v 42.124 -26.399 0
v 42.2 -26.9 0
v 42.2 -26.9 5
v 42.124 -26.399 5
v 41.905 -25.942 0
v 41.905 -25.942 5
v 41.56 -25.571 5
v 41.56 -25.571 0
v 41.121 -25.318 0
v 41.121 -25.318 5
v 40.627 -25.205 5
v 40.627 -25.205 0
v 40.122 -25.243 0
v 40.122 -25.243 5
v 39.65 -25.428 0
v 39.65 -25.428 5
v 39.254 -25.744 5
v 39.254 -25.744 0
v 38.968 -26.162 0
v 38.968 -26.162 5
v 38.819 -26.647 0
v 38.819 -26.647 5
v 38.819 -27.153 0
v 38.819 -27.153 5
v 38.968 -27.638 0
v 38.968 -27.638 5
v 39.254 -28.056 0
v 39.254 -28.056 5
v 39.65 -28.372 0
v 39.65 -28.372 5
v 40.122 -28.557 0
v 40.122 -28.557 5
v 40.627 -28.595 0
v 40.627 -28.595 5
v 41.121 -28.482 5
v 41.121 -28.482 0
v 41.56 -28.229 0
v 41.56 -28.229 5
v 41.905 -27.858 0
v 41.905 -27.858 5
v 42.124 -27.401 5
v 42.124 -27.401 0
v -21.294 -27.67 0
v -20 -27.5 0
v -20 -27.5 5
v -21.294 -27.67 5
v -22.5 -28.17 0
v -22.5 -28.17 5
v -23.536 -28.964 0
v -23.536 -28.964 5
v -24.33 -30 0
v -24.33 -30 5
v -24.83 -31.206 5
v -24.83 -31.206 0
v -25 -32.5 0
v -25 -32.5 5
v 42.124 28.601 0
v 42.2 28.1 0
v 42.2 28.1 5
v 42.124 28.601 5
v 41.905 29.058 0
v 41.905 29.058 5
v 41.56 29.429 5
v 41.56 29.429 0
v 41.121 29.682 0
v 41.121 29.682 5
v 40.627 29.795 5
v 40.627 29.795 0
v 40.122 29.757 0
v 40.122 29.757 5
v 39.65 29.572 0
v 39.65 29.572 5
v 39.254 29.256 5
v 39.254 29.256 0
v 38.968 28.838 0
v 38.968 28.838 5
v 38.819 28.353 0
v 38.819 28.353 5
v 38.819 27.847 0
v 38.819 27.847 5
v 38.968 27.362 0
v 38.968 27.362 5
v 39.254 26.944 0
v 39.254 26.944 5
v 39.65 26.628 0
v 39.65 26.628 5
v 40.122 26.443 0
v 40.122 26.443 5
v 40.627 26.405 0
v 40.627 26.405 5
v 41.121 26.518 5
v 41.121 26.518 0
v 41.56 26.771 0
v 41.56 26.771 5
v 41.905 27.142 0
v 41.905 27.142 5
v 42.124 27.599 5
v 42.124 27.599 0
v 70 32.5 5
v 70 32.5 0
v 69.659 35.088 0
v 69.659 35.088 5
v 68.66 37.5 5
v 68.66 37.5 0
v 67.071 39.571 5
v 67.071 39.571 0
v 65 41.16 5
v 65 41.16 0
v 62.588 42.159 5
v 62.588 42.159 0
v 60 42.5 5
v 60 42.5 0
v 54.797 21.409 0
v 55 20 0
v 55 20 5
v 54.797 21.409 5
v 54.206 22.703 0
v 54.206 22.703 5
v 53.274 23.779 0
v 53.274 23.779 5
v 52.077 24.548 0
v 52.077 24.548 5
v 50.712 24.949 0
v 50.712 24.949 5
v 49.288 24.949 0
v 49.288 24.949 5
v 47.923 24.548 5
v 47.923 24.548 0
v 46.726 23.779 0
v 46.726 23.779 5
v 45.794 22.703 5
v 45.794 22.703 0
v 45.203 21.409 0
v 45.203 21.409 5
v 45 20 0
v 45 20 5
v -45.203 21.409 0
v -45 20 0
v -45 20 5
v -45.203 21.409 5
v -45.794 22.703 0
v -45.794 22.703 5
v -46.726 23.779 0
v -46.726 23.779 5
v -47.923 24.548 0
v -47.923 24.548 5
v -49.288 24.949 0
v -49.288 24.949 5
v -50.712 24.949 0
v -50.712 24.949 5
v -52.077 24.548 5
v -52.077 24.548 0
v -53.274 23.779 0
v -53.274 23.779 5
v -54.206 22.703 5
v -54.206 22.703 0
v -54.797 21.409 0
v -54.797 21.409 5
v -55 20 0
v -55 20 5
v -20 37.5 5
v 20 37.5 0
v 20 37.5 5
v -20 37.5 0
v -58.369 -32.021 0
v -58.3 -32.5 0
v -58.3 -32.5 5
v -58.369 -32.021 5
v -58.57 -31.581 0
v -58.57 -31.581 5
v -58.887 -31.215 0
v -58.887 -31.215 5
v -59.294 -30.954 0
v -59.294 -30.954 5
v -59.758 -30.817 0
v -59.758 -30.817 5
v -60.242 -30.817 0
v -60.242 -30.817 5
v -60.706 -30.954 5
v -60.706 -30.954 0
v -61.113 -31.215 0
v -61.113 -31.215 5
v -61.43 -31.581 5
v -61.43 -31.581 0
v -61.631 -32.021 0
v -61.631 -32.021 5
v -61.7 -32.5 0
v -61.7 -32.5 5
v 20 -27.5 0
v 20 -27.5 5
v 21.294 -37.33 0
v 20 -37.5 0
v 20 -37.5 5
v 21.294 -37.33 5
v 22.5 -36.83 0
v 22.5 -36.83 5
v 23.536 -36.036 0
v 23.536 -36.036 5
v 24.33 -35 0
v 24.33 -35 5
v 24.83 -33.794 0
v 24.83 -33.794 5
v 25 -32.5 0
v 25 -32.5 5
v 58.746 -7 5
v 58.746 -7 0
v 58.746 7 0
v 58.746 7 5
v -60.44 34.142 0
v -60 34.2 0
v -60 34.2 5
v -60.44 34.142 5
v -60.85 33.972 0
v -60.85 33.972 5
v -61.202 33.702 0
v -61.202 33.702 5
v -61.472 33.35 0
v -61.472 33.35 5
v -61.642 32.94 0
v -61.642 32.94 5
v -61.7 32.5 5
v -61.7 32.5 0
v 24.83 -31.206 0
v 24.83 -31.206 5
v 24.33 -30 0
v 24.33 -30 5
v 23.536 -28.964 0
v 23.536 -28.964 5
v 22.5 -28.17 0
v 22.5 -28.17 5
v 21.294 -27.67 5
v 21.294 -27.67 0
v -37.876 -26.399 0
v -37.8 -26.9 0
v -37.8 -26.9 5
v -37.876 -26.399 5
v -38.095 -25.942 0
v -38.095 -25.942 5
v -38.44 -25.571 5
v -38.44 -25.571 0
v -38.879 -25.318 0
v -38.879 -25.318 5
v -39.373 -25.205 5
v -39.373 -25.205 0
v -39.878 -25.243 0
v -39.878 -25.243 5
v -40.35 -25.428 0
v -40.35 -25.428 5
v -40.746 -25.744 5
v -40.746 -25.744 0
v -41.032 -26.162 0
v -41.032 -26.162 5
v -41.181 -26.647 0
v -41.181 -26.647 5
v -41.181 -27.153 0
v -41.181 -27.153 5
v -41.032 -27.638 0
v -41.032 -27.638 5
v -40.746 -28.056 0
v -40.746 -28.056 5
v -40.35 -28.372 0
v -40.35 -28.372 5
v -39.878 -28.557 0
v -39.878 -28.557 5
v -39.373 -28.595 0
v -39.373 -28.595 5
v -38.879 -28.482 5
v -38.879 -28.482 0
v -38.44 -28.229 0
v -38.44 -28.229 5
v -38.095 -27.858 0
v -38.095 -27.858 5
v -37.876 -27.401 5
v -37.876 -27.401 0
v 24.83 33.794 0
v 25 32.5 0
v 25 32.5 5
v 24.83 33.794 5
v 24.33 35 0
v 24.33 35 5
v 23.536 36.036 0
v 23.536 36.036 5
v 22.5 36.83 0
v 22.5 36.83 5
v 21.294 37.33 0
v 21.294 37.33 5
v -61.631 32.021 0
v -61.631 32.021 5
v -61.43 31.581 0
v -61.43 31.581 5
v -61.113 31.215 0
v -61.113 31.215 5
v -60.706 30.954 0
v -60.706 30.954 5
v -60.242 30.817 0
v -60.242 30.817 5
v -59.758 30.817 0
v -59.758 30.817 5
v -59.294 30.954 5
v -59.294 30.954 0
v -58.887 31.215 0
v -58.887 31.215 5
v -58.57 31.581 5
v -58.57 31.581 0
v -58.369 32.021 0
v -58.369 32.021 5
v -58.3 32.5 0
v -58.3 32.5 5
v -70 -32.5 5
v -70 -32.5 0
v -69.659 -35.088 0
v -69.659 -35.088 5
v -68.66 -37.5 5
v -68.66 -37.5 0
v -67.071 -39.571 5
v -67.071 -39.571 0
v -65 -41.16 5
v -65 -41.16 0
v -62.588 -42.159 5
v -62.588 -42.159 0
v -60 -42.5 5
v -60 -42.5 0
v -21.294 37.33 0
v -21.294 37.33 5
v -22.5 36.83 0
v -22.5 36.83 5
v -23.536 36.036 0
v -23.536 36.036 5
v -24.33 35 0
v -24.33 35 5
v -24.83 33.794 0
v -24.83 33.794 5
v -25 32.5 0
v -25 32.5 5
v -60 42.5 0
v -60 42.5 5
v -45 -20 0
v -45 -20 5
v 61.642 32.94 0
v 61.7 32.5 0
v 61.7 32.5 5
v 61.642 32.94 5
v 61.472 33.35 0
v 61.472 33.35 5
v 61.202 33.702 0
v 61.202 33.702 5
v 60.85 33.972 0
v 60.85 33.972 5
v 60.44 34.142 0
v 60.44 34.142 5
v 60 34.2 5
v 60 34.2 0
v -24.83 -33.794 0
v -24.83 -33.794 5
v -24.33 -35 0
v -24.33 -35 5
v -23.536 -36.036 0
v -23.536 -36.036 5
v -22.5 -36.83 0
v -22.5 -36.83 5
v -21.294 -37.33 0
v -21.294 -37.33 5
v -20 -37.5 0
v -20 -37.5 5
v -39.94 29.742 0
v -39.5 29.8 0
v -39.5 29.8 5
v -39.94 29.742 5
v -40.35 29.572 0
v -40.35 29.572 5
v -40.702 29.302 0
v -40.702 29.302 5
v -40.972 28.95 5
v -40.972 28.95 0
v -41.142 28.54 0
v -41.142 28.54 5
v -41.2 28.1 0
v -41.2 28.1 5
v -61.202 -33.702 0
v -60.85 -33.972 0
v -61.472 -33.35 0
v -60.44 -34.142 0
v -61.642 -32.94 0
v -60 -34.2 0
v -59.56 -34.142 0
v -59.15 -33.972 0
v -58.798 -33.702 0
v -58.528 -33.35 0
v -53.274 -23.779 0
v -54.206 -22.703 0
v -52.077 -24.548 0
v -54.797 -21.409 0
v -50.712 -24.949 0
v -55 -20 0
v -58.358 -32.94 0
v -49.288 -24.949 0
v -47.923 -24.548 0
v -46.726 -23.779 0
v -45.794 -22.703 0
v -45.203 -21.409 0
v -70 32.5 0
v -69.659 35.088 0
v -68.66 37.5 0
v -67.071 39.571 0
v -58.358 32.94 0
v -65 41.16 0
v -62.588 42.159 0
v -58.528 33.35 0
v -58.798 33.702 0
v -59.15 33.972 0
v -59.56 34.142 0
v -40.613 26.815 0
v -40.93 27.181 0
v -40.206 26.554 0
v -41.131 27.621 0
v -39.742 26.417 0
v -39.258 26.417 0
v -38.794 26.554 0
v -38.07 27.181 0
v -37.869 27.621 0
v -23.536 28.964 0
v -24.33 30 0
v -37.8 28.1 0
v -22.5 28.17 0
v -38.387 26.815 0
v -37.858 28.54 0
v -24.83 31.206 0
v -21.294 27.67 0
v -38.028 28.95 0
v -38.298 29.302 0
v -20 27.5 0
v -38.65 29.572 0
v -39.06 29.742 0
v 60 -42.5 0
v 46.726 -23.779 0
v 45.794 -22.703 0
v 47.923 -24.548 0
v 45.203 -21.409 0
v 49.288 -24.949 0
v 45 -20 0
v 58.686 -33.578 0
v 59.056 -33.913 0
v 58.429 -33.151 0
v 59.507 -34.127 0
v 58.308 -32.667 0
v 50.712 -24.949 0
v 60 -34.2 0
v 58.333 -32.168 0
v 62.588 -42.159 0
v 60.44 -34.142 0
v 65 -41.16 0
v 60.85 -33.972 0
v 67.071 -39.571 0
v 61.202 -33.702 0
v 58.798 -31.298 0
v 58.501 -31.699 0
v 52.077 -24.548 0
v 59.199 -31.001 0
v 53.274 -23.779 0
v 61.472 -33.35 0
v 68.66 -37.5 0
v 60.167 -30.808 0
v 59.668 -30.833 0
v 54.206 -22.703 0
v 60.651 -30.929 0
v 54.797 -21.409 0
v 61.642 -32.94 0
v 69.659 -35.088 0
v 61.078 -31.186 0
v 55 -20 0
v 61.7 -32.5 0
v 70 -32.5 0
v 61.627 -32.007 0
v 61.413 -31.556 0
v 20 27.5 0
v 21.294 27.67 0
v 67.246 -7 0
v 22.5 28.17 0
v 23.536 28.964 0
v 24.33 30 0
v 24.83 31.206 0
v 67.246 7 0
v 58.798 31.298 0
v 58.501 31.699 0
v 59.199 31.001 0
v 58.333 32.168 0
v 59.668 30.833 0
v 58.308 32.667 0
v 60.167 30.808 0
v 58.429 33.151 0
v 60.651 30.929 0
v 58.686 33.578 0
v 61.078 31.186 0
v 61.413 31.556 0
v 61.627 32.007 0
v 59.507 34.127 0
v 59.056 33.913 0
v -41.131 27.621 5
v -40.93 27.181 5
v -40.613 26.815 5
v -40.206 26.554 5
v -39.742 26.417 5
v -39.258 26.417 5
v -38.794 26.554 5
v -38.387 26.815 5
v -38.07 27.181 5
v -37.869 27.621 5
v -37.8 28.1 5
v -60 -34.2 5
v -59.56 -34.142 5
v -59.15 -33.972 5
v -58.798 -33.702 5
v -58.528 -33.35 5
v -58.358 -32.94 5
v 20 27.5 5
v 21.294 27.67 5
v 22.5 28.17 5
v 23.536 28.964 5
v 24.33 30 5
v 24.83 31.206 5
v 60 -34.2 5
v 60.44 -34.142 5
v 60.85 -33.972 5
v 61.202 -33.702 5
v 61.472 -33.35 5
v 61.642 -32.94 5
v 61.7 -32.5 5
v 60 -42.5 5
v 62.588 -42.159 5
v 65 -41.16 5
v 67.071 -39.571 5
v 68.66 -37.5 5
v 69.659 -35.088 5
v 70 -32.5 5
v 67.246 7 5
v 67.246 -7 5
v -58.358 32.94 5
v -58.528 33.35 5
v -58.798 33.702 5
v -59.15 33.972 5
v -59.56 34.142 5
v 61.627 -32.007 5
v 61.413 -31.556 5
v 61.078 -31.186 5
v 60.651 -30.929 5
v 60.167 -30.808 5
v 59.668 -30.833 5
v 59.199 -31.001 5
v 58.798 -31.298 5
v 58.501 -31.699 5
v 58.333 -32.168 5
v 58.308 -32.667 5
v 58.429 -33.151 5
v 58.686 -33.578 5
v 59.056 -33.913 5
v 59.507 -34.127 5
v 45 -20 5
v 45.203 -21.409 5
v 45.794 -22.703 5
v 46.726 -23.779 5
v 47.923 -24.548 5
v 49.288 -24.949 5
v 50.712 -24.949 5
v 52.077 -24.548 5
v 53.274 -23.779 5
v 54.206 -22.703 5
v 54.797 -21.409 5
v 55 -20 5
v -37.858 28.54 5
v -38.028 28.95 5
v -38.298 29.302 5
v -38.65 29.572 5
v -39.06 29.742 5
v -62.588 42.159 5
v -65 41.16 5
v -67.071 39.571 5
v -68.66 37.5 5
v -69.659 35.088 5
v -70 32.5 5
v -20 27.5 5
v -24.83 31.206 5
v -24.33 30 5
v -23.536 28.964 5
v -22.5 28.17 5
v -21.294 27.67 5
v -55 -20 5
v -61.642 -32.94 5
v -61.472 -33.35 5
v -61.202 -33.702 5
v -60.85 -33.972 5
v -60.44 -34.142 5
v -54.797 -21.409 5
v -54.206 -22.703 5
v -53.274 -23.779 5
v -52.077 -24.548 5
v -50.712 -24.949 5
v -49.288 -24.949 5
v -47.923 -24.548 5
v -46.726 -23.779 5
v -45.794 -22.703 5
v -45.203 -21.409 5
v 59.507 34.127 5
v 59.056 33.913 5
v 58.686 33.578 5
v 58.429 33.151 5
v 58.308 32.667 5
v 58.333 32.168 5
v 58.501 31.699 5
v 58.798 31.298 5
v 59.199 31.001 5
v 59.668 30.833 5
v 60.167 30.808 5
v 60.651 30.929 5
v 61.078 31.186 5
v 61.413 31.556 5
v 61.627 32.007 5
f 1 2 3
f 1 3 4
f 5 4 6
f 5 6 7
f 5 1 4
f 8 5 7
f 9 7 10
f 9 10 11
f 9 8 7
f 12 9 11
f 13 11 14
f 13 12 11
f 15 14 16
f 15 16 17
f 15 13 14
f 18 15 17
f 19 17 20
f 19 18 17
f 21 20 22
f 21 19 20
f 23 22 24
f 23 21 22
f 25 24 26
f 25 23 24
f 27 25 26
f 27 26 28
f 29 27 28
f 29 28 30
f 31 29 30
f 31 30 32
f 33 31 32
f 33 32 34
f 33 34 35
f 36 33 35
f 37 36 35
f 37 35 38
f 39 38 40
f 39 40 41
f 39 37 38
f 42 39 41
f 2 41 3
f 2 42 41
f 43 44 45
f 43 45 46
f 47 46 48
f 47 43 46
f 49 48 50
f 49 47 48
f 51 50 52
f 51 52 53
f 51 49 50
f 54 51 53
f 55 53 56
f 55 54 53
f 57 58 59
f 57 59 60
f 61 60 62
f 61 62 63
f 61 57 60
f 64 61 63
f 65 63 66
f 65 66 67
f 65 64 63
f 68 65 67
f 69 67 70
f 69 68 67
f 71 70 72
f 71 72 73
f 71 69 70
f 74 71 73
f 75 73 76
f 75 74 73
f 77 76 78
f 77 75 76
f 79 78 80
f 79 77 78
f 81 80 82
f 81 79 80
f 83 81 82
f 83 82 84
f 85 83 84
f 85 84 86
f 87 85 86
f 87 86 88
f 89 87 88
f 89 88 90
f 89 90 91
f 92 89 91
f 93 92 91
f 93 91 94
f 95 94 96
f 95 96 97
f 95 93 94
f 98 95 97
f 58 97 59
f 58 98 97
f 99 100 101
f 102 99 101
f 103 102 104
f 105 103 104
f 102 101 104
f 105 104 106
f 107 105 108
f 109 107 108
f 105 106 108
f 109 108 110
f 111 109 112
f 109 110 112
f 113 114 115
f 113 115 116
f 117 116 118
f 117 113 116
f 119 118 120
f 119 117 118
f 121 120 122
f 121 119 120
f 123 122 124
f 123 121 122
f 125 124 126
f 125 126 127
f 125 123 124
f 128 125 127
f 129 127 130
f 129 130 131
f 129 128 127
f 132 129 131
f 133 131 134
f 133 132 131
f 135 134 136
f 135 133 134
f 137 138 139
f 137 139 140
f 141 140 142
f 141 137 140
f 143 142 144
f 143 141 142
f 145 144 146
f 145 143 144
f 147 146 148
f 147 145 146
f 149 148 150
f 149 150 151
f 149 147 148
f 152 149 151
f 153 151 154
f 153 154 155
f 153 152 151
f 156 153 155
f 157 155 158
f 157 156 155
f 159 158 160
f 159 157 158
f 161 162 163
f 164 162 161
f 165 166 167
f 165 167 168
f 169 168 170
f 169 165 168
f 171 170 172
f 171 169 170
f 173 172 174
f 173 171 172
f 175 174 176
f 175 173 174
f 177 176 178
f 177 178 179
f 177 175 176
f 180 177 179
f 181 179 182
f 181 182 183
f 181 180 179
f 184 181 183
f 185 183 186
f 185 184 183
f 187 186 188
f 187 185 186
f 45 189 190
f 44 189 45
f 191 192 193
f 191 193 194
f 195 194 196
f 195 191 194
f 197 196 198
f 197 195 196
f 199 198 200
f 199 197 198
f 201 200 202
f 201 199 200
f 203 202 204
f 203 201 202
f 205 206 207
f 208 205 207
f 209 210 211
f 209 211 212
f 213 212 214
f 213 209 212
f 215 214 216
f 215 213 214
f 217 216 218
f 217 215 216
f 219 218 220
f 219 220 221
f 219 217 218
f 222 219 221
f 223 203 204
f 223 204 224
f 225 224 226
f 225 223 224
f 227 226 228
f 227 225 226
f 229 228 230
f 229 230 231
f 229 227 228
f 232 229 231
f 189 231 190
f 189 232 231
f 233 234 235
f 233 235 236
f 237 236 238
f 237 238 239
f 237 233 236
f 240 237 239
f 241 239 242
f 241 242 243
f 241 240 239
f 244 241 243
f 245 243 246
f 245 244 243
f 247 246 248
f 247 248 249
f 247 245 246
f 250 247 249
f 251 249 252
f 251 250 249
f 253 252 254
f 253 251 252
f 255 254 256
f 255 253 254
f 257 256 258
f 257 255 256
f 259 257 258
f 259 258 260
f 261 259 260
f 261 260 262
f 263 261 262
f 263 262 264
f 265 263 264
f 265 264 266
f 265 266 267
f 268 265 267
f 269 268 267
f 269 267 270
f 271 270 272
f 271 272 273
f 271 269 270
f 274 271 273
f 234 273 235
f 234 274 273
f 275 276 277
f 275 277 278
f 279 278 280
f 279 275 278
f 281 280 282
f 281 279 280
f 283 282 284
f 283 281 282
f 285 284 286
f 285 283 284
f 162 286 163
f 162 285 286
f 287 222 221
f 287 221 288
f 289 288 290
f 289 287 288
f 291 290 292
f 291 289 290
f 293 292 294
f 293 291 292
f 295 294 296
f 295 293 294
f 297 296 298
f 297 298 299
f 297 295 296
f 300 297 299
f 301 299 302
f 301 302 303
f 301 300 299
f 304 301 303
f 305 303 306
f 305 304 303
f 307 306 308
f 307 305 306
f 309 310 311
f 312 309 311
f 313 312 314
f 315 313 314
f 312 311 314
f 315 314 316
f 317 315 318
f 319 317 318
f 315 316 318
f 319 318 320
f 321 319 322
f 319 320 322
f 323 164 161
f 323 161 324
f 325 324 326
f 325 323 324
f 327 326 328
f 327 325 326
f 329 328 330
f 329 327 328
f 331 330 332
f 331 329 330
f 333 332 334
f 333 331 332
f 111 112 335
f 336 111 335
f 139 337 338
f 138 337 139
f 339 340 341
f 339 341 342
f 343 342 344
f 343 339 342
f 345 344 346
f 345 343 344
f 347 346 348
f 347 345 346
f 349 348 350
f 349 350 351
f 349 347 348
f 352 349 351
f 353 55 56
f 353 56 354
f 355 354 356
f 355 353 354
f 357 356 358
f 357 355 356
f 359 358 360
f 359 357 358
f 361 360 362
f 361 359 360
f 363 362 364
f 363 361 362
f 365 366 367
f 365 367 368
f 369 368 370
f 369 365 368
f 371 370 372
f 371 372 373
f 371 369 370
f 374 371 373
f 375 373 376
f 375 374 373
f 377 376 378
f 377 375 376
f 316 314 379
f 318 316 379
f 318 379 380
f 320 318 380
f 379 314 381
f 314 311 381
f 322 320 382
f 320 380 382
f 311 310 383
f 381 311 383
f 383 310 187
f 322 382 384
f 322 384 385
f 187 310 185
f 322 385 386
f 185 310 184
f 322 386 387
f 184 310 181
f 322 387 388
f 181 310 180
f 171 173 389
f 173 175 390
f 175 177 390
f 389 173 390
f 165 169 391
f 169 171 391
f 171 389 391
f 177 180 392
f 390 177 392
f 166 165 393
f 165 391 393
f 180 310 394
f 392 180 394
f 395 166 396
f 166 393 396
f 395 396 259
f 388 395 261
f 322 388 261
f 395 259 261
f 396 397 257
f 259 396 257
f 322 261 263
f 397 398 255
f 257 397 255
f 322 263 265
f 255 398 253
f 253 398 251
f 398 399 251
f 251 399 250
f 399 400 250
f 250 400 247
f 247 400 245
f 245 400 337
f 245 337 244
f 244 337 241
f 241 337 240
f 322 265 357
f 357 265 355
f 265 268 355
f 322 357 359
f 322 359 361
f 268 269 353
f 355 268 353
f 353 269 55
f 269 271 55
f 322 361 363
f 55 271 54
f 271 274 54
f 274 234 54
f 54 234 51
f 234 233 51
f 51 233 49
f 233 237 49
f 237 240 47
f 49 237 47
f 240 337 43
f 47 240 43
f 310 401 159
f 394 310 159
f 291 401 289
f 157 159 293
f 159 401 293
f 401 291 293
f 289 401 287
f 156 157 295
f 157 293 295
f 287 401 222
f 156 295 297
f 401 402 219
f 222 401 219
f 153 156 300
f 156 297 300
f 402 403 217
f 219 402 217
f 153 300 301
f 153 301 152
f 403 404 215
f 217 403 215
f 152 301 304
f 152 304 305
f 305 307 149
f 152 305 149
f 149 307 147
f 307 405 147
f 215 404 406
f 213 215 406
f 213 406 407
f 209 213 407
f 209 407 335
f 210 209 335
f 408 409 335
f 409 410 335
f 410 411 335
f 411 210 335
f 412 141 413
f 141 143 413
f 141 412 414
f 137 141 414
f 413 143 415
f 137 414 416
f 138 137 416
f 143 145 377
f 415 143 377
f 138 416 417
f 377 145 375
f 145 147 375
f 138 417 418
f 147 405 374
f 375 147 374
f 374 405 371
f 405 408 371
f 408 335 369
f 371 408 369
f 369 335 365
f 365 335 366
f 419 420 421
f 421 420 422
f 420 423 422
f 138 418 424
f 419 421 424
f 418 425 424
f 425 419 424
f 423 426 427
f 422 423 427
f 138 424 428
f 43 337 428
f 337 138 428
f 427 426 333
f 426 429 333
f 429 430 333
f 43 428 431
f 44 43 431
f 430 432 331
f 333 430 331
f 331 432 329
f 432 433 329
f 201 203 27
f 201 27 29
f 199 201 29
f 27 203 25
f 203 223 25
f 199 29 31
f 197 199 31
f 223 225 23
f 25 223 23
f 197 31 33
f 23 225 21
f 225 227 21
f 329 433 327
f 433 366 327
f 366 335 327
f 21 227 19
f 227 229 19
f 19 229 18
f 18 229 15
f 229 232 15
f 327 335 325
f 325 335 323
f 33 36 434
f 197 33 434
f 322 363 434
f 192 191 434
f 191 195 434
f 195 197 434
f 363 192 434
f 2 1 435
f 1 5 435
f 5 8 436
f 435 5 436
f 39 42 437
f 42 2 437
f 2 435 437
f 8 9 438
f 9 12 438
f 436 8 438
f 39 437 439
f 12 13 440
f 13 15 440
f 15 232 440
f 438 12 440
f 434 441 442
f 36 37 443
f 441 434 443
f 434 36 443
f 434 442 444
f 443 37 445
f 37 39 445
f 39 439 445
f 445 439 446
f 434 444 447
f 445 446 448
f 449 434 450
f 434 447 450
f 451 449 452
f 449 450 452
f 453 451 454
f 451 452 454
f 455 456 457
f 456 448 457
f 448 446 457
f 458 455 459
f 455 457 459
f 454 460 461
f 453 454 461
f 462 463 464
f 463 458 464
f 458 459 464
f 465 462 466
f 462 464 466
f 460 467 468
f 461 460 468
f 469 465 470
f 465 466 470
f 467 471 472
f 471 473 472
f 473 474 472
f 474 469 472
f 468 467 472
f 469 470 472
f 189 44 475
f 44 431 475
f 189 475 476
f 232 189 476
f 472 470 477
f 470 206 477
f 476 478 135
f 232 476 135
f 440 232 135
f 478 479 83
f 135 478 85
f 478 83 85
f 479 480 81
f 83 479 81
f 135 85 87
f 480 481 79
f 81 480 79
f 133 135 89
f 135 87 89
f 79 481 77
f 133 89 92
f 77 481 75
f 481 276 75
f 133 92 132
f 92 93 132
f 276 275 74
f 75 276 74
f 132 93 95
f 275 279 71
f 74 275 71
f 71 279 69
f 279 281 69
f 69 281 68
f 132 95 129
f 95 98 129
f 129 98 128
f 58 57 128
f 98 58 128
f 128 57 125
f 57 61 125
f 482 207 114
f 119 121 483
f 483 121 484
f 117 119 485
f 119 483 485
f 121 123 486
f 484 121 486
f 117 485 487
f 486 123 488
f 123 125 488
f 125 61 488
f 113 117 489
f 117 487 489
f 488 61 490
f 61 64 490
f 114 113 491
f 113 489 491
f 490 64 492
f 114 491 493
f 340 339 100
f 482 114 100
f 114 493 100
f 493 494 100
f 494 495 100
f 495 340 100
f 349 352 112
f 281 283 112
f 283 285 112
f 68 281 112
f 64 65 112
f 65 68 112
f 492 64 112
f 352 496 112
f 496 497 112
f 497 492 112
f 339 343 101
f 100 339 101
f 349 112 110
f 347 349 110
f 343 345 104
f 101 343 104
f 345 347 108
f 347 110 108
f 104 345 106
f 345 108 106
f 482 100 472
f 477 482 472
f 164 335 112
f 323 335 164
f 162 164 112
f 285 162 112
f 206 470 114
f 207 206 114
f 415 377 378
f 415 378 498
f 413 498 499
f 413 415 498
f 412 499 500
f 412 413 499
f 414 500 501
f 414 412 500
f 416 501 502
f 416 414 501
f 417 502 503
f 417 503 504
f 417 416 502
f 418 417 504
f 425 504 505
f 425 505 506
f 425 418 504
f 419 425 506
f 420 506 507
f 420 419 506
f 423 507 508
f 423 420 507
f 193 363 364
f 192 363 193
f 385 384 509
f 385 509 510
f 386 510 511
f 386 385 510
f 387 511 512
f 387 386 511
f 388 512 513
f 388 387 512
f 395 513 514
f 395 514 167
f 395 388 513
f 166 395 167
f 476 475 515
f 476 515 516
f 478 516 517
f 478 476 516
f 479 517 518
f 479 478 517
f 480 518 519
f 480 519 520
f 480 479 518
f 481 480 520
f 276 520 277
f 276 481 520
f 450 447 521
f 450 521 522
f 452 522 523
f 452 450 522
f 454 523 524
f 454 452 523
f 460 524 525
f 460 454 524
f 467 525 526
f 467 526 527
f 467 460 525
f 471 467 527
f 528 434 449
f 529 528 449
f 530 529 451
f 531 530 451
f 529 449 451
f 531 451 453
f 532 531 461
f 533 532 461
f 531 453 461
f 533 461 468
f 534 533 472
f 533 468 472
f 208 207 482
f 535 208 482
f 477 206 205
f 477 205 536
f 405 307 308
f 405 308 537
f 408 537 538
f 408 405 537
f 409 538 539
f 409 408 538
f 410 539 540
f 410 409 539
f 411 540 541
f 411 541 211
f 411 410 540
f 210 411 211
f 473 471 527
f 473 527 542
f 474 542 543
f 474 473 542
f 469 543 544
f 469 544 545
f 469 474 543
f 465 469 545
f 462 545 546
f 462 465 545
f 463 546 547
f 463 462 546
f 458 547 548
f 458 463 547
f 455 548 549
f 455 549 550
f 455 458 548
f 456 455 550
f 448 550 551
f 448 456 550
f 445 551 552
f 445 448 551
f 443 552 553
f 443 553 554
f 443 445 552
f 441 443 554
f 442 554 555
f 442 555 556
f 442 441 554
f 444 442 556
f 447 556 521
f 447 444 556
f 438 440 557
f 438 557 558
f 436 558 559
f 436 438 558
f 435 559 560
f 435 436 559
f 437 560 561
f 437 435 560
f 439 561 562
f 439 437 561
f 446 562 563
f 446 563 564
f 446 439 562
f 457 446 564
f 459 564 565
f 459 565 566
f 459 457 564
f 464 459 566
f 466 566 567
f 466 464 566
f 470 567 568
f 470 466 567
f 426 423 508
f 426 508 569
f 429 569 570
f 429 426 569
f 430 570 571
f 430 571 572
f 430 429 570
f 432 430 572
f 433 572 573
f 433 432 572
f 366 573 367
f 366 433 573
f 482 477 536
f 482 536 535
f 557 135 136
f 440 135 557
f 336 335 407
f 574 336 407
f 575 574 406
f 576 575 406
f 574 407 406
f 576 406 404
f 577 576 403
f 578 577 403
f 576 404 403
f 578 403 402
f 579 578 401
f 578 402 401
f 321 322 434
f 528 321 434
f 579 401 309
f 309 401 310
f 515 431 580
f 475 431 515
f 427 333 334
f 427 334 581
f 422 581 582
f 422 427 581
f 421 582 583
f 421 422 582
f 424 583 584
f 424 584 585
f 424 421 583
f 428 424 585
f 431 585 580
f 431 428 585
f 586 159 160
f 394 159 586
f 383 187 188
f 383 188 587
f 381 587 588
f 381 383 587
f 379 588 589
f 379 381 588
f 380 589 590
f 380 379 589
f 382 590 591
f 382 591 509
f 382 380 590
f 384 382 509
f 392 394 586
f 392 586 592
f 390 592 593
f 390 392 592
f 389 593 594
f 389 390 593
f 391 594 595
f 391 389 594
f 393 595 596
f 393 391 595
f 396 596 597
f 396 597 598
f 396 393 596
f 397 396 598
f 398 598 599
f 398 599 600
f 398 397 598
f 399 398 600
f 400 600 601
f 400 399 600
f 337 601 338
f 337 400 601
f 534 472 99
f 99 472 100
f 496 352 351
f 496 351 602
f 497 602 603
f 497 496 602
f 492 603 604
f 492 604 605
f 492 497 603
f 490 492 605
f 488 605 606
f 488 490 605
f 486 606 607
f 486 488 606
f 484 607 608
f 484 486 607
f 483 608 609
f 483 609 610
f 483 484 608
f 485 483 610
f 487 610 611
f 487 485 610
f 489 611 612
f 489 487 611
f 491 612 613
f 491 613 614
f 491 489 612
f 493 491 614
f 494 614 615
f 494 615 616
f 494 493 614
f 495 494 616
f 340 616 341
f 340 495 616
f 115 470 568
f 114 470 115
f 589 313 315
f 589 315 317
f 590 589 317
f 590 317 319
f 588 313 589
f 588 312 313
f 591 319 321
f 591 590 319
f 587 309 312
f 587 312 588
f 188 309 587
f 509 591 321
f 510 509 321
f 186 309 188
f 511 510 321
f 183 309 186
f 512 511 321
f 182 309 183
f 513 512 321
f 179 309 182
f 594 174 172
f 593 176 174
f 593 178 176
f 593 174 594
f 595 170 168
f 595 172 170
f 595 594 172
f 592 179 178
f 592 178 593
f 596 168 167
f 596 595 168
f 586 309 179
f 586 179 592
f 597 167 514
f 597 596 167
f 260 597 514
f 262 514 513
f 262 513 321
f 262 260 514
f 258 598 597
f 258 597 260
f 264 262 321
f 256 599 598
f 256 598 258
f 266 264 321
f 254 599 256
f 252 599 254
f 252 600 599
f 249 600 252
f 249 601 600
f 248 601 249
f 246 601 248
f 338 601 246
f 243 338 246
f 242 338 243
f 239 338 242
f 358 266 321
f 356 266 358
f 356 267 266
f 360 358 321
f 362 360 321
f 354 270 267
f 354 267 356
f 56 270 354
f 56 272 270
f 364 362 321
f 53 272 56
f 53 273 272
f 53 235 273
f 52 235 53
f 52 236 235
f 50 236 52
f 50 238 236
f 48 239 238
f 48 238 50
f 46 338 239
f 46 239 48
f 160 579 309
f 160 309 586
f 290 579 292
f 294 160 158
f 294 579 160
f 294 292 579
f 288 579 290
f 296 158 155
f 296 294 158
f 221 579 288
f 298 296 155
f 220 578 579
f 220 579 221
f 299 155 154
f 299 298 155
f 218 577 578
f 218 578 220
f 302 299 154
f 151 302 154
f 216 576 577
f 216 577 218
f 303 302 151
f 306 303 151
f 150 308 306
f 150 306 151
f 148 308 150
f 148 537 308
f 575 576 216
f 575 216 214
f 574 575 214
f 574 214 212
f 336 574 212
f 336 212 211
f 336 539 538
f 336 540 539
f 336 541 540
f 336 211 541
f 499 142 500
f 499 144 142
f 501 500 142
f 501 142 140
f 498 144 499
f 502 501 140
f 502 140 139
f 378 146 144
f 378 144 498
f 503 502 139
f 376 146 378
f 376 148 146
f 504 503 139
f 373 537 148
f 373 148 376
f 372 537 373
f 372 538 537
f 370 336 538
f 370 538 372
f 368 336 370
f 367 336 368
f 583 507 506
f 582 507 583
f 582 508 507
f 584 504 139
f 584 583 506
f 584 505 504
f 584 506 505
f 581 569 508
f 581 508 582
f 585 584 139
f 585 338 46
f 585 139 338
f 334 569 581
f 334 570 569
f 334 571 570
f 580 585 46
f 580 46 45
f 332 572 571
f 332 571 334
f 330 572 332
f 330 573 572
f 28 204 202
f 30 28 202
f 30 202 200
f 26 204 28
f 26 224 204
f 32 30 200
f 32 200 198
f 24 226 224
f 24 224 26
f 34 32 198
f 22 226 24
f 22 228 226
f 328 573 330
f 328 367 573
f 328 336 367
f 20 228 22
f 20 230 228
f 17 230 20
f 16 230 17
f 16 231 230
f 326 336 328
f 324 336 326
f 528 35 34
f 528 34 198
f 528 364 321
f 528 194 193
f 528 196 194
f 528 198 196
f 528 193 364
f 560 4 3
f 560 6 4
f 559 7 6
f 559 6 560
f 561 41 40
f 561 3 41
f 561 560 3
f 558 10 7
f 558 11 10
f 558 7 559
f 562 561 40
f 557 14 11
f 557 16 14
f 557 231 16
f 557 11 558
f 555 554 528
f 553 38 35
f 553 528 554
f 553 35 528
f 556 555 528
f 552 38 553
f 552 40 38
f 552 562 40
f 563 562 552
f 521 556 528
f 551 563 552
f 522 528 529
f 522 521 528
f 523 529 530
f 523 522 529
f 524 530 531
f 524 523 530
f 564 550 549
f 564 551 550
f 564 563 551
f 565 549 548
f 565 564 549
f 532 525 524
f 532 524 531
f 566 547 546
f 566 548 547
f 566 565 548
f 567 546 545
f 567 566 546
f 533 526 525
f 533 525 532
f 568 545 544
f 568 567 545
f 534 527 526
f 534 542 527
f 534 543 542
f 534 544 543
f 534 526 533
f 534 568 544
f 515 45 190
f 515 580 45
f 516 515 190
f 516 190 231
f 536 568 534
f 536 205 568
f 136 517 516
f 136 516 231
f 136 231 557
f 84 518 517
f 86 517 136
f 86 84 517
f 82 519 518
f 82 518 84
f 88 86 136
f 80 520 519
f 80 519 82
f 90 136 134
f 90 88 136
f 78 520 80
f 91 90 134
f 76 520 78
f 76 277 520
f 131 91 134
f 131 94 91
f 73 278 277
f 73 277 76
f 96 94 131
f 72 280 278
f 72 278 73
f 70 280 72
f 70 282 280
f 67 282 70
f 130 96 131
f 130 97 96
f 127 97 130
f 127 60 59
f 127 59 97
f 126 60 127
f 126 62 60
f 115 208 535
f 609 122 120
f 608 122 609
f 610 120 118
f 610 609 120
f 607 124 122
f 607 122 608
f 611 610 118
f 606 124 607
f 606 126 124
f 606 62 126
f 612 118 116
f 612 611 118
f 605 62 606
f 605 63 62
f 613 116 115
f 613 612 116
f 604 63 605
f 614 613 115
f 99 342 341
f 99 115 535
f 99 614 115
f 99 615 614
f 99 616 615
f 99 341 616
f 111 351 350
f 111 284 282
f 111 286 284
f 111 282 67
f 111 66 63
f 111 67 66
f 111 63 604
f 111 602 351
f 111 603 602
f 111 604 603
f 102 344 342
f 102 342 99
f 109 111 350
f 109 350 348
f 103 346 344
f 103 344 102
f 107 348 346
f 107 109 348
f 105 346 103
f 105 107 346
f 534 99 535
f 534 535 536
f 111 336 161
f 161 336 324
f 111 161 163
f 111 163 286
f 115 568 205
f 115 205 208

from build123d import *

# Parameters (mm, degrees)
BOSS_EXTRUDE1_DEPTH = 5
SKETCH2_R           = 1.7
SKETCH2_W           = 8.5
SKETCH2_H           = 14
CUT_EXTRUDE9_DEPTH  = 5


with BuildPart() as part:
    # Sketch1 → Boss-Extrude1 (new body)
    with BuildSketch(Plane.XY):
        with BuildLine():
            Line((-60, -42.5), (60, -42.5))
            ThreePointArc((60, -42.5), (67.071067812, -39.571067812), (70, -32.5))
            Line((70, -32.5), (70, 32.5))
            ThreePointArc((70, 32.5), (67.071067812, 39.571067812), (60, 42.5))
            Line((60, 42.5), (-60, 42.5))
            ThreePointArc((-60, 42.5), (-67.071067812, 39.571067812), (-70, 32.5))
            Line((-70, 32.5), (-70, -32.5))
            ThreePointArc((-70, -32.5), (-67.071067812, -39.571067812), (-60, -42.5))
        make_face()
    extrude(amount=BOSS_EXTRUDE1_DEPTH)

    # Sketch2 → Cut-Extrude9 (cut)
    with BuildSketch(Plane.XY):
        with BuildLine():
            Line((25, 32.5), (-25, 32.5))
            ThreePointArc((-25, 32.5), (-23.535533906, 28.964466094), (-20, 27.5))
            Line((-20, 27.5), (20, 27.5))
            ThreePointArc((20, 27.5), (23.535533906, 28.964466094), (25, 32.5))
        make_face()
        with BuildLine():
            ThreePointArc((-20, 37.5), (-23.535533906, 36.035533906), (-25, 32.5))
            Line((-25, 32.5), (25, 32.5))
            ThreePointArc((25, 32.5), (23.535533906, 36.035533906), (20, 37.5))
            Line((20, 37.5), (-20, 37.5))
        make_face()
        with BuildLine():
            Line((45, 20), (45, -20))
            ThreePointArc((45, -20), (50, -25), (55, -20))
            Line((55, -20), (55, 20))
            ThreePointArc((55, 20), (50, 25), (45, 20))
        make_face()
        with BuildLine():
            ThreePointArc((60, 34.2), (58.797918472, 31.297918472), (61.7, 32.5))
            Line((61.7, 32.5), (60, 32.5))
            Line((60, 32.5), (60, 34.2))
        make_face()
        with BuildLine():
            Line((60, 32.5), (61.7, 32.5))
            ThreePointArc((61.7, 32.5), (61.202081528, 33.702081528), (60, 34.2))
            Line((60, 34.2), (60, 32.5))
        make_face()
        with BuildLine():
            ThreePointArc((60, -34.2), (61.202081528, -33.702081528), (61.7, -32.5))
            Line((61.7, -32.5), (60, -32.5))
            Line((60, -32.5), (60, -34.2))
        make_face()
        with BuildLine():
            Line((60, -32.5), (61.7, -32.5))
            ThreePointArc((61.7, -32.5), (58.797918472, -31.297918472), (60, -34.2))
            Line((60, -34.2), (60, -32.5))
        make_face()
        with Locations((40.5, -26.9)):
            Circle(SKETCH2_R)
        with BuildLine():
            ThreePointArc((-20, -27.5), (-23.535533906, -28.964466094), (-25, -32.5))
            Line((-25, -32.5), (25, -32.5))
            ThreePointArc((25, -32.5), (23.535533906, -28.964466094), (20, -27.5))
            Line((20, -27.5), (-20, -27.5))
        make_face()
        with BuildLine():
            Line((25, -32.5), (-25, -32.5))
            ThreePointArc((-25, -32.5), (-23.535533906, -36.035533906), (-20, -37.5))
            Line((-20, -37.5), (20, -37.5))
            ThreePointArc((20, -37.5), (23.535533906, -36.035533906), (25, -32.5))
        make_face()
        with Locations((-39.5, -26.9)):
            Circle(SKETCH2_R)
        with BuildLine():
            ThreePointArc((-37.8, 28.1), (-38.297918472, 29.302081528), (-39.5, 29.8))
            Line((-39.5, 29.8), (-39.5, 28.1))
            Line((-39.5, 28.1), (-41.2, 28.1))
            ThreePointArc((-41.2, 28.1), (-39.5, 26.4), (-37.8, 28.1))
        make_face()
        with BuildLine():
            Line((-39.5, 28.1), (-39.5, 29.8))
            ThreePointArc((-39.5, 29.8), (-40.702081528, 29.302081528), (-41.2, 28.1))
            Line((-41.2, 28.1), (-39.5, 28.1))
        make_face()
        with BuildLine():
            Line((-55, 20), (-55, -20))
            ThreePointArc((-55, -20), (-50, -25), (-45, -20))
            Line((-45, -20), (-45, 20))
            ThreePointArc((-45, 20), (-50, 25), (-55, 20))
        make_face()
        with BuildLine():
            ThreePointArc((-60, 34.2), (-61.202081528, 33.702081528), (-61.7, 32.5))
            Line((-61.7, 32.5), (-60, 32.5))
            Line((-60, 32.5), (-60, 34.2))
        make_face()
        with BuildLine():
            Line((-60, 32.5), (-61.7, 32.5))
            ThreePointArc((-61.7, 32.5), (-60, 30.8), (-58.3, 32.5))
            ThreePointArc((-58.3, 32.5), (-58.797918472, 33.702081528), (-60, 34.2))
            Line((-60, 34.2), (-60, 32.5))
        make_face()
        with BuildLine():
            ThreePointArc((-58.3, -32.5), (-60, -30.8), (-61.7, -32.5))
            Line((-61.7, -32.5), (-60, -32.5))
            Line((-60, -32.5), (-60, -34.2))
            ThreePointArc((-60, -34.2), (-58.797918472, -33.702081528), (-58.3, -32.5))
        make_face()
        with BuildLine():
            Line((-60, -32.5), (-61.7, -32.5))
            ThreePointArc((-61.7, -32.5), (-61.202081528, -33.702081528), (-60, -34.2))
            Line((-60, -34.2), (-60, -32.5))
        make_face()
        with Locations((40.5, 28.1)):
            Circle(SKETCH2_R)
        with Locations((62.995775603, 0)):
            Rectangle(SKETCH2_W, SKETCH2_H)
    extrude(amount=CUT_EXTRUDE9_DEPTH, mode=Mode.SUBTRACT)


solid = part.part
